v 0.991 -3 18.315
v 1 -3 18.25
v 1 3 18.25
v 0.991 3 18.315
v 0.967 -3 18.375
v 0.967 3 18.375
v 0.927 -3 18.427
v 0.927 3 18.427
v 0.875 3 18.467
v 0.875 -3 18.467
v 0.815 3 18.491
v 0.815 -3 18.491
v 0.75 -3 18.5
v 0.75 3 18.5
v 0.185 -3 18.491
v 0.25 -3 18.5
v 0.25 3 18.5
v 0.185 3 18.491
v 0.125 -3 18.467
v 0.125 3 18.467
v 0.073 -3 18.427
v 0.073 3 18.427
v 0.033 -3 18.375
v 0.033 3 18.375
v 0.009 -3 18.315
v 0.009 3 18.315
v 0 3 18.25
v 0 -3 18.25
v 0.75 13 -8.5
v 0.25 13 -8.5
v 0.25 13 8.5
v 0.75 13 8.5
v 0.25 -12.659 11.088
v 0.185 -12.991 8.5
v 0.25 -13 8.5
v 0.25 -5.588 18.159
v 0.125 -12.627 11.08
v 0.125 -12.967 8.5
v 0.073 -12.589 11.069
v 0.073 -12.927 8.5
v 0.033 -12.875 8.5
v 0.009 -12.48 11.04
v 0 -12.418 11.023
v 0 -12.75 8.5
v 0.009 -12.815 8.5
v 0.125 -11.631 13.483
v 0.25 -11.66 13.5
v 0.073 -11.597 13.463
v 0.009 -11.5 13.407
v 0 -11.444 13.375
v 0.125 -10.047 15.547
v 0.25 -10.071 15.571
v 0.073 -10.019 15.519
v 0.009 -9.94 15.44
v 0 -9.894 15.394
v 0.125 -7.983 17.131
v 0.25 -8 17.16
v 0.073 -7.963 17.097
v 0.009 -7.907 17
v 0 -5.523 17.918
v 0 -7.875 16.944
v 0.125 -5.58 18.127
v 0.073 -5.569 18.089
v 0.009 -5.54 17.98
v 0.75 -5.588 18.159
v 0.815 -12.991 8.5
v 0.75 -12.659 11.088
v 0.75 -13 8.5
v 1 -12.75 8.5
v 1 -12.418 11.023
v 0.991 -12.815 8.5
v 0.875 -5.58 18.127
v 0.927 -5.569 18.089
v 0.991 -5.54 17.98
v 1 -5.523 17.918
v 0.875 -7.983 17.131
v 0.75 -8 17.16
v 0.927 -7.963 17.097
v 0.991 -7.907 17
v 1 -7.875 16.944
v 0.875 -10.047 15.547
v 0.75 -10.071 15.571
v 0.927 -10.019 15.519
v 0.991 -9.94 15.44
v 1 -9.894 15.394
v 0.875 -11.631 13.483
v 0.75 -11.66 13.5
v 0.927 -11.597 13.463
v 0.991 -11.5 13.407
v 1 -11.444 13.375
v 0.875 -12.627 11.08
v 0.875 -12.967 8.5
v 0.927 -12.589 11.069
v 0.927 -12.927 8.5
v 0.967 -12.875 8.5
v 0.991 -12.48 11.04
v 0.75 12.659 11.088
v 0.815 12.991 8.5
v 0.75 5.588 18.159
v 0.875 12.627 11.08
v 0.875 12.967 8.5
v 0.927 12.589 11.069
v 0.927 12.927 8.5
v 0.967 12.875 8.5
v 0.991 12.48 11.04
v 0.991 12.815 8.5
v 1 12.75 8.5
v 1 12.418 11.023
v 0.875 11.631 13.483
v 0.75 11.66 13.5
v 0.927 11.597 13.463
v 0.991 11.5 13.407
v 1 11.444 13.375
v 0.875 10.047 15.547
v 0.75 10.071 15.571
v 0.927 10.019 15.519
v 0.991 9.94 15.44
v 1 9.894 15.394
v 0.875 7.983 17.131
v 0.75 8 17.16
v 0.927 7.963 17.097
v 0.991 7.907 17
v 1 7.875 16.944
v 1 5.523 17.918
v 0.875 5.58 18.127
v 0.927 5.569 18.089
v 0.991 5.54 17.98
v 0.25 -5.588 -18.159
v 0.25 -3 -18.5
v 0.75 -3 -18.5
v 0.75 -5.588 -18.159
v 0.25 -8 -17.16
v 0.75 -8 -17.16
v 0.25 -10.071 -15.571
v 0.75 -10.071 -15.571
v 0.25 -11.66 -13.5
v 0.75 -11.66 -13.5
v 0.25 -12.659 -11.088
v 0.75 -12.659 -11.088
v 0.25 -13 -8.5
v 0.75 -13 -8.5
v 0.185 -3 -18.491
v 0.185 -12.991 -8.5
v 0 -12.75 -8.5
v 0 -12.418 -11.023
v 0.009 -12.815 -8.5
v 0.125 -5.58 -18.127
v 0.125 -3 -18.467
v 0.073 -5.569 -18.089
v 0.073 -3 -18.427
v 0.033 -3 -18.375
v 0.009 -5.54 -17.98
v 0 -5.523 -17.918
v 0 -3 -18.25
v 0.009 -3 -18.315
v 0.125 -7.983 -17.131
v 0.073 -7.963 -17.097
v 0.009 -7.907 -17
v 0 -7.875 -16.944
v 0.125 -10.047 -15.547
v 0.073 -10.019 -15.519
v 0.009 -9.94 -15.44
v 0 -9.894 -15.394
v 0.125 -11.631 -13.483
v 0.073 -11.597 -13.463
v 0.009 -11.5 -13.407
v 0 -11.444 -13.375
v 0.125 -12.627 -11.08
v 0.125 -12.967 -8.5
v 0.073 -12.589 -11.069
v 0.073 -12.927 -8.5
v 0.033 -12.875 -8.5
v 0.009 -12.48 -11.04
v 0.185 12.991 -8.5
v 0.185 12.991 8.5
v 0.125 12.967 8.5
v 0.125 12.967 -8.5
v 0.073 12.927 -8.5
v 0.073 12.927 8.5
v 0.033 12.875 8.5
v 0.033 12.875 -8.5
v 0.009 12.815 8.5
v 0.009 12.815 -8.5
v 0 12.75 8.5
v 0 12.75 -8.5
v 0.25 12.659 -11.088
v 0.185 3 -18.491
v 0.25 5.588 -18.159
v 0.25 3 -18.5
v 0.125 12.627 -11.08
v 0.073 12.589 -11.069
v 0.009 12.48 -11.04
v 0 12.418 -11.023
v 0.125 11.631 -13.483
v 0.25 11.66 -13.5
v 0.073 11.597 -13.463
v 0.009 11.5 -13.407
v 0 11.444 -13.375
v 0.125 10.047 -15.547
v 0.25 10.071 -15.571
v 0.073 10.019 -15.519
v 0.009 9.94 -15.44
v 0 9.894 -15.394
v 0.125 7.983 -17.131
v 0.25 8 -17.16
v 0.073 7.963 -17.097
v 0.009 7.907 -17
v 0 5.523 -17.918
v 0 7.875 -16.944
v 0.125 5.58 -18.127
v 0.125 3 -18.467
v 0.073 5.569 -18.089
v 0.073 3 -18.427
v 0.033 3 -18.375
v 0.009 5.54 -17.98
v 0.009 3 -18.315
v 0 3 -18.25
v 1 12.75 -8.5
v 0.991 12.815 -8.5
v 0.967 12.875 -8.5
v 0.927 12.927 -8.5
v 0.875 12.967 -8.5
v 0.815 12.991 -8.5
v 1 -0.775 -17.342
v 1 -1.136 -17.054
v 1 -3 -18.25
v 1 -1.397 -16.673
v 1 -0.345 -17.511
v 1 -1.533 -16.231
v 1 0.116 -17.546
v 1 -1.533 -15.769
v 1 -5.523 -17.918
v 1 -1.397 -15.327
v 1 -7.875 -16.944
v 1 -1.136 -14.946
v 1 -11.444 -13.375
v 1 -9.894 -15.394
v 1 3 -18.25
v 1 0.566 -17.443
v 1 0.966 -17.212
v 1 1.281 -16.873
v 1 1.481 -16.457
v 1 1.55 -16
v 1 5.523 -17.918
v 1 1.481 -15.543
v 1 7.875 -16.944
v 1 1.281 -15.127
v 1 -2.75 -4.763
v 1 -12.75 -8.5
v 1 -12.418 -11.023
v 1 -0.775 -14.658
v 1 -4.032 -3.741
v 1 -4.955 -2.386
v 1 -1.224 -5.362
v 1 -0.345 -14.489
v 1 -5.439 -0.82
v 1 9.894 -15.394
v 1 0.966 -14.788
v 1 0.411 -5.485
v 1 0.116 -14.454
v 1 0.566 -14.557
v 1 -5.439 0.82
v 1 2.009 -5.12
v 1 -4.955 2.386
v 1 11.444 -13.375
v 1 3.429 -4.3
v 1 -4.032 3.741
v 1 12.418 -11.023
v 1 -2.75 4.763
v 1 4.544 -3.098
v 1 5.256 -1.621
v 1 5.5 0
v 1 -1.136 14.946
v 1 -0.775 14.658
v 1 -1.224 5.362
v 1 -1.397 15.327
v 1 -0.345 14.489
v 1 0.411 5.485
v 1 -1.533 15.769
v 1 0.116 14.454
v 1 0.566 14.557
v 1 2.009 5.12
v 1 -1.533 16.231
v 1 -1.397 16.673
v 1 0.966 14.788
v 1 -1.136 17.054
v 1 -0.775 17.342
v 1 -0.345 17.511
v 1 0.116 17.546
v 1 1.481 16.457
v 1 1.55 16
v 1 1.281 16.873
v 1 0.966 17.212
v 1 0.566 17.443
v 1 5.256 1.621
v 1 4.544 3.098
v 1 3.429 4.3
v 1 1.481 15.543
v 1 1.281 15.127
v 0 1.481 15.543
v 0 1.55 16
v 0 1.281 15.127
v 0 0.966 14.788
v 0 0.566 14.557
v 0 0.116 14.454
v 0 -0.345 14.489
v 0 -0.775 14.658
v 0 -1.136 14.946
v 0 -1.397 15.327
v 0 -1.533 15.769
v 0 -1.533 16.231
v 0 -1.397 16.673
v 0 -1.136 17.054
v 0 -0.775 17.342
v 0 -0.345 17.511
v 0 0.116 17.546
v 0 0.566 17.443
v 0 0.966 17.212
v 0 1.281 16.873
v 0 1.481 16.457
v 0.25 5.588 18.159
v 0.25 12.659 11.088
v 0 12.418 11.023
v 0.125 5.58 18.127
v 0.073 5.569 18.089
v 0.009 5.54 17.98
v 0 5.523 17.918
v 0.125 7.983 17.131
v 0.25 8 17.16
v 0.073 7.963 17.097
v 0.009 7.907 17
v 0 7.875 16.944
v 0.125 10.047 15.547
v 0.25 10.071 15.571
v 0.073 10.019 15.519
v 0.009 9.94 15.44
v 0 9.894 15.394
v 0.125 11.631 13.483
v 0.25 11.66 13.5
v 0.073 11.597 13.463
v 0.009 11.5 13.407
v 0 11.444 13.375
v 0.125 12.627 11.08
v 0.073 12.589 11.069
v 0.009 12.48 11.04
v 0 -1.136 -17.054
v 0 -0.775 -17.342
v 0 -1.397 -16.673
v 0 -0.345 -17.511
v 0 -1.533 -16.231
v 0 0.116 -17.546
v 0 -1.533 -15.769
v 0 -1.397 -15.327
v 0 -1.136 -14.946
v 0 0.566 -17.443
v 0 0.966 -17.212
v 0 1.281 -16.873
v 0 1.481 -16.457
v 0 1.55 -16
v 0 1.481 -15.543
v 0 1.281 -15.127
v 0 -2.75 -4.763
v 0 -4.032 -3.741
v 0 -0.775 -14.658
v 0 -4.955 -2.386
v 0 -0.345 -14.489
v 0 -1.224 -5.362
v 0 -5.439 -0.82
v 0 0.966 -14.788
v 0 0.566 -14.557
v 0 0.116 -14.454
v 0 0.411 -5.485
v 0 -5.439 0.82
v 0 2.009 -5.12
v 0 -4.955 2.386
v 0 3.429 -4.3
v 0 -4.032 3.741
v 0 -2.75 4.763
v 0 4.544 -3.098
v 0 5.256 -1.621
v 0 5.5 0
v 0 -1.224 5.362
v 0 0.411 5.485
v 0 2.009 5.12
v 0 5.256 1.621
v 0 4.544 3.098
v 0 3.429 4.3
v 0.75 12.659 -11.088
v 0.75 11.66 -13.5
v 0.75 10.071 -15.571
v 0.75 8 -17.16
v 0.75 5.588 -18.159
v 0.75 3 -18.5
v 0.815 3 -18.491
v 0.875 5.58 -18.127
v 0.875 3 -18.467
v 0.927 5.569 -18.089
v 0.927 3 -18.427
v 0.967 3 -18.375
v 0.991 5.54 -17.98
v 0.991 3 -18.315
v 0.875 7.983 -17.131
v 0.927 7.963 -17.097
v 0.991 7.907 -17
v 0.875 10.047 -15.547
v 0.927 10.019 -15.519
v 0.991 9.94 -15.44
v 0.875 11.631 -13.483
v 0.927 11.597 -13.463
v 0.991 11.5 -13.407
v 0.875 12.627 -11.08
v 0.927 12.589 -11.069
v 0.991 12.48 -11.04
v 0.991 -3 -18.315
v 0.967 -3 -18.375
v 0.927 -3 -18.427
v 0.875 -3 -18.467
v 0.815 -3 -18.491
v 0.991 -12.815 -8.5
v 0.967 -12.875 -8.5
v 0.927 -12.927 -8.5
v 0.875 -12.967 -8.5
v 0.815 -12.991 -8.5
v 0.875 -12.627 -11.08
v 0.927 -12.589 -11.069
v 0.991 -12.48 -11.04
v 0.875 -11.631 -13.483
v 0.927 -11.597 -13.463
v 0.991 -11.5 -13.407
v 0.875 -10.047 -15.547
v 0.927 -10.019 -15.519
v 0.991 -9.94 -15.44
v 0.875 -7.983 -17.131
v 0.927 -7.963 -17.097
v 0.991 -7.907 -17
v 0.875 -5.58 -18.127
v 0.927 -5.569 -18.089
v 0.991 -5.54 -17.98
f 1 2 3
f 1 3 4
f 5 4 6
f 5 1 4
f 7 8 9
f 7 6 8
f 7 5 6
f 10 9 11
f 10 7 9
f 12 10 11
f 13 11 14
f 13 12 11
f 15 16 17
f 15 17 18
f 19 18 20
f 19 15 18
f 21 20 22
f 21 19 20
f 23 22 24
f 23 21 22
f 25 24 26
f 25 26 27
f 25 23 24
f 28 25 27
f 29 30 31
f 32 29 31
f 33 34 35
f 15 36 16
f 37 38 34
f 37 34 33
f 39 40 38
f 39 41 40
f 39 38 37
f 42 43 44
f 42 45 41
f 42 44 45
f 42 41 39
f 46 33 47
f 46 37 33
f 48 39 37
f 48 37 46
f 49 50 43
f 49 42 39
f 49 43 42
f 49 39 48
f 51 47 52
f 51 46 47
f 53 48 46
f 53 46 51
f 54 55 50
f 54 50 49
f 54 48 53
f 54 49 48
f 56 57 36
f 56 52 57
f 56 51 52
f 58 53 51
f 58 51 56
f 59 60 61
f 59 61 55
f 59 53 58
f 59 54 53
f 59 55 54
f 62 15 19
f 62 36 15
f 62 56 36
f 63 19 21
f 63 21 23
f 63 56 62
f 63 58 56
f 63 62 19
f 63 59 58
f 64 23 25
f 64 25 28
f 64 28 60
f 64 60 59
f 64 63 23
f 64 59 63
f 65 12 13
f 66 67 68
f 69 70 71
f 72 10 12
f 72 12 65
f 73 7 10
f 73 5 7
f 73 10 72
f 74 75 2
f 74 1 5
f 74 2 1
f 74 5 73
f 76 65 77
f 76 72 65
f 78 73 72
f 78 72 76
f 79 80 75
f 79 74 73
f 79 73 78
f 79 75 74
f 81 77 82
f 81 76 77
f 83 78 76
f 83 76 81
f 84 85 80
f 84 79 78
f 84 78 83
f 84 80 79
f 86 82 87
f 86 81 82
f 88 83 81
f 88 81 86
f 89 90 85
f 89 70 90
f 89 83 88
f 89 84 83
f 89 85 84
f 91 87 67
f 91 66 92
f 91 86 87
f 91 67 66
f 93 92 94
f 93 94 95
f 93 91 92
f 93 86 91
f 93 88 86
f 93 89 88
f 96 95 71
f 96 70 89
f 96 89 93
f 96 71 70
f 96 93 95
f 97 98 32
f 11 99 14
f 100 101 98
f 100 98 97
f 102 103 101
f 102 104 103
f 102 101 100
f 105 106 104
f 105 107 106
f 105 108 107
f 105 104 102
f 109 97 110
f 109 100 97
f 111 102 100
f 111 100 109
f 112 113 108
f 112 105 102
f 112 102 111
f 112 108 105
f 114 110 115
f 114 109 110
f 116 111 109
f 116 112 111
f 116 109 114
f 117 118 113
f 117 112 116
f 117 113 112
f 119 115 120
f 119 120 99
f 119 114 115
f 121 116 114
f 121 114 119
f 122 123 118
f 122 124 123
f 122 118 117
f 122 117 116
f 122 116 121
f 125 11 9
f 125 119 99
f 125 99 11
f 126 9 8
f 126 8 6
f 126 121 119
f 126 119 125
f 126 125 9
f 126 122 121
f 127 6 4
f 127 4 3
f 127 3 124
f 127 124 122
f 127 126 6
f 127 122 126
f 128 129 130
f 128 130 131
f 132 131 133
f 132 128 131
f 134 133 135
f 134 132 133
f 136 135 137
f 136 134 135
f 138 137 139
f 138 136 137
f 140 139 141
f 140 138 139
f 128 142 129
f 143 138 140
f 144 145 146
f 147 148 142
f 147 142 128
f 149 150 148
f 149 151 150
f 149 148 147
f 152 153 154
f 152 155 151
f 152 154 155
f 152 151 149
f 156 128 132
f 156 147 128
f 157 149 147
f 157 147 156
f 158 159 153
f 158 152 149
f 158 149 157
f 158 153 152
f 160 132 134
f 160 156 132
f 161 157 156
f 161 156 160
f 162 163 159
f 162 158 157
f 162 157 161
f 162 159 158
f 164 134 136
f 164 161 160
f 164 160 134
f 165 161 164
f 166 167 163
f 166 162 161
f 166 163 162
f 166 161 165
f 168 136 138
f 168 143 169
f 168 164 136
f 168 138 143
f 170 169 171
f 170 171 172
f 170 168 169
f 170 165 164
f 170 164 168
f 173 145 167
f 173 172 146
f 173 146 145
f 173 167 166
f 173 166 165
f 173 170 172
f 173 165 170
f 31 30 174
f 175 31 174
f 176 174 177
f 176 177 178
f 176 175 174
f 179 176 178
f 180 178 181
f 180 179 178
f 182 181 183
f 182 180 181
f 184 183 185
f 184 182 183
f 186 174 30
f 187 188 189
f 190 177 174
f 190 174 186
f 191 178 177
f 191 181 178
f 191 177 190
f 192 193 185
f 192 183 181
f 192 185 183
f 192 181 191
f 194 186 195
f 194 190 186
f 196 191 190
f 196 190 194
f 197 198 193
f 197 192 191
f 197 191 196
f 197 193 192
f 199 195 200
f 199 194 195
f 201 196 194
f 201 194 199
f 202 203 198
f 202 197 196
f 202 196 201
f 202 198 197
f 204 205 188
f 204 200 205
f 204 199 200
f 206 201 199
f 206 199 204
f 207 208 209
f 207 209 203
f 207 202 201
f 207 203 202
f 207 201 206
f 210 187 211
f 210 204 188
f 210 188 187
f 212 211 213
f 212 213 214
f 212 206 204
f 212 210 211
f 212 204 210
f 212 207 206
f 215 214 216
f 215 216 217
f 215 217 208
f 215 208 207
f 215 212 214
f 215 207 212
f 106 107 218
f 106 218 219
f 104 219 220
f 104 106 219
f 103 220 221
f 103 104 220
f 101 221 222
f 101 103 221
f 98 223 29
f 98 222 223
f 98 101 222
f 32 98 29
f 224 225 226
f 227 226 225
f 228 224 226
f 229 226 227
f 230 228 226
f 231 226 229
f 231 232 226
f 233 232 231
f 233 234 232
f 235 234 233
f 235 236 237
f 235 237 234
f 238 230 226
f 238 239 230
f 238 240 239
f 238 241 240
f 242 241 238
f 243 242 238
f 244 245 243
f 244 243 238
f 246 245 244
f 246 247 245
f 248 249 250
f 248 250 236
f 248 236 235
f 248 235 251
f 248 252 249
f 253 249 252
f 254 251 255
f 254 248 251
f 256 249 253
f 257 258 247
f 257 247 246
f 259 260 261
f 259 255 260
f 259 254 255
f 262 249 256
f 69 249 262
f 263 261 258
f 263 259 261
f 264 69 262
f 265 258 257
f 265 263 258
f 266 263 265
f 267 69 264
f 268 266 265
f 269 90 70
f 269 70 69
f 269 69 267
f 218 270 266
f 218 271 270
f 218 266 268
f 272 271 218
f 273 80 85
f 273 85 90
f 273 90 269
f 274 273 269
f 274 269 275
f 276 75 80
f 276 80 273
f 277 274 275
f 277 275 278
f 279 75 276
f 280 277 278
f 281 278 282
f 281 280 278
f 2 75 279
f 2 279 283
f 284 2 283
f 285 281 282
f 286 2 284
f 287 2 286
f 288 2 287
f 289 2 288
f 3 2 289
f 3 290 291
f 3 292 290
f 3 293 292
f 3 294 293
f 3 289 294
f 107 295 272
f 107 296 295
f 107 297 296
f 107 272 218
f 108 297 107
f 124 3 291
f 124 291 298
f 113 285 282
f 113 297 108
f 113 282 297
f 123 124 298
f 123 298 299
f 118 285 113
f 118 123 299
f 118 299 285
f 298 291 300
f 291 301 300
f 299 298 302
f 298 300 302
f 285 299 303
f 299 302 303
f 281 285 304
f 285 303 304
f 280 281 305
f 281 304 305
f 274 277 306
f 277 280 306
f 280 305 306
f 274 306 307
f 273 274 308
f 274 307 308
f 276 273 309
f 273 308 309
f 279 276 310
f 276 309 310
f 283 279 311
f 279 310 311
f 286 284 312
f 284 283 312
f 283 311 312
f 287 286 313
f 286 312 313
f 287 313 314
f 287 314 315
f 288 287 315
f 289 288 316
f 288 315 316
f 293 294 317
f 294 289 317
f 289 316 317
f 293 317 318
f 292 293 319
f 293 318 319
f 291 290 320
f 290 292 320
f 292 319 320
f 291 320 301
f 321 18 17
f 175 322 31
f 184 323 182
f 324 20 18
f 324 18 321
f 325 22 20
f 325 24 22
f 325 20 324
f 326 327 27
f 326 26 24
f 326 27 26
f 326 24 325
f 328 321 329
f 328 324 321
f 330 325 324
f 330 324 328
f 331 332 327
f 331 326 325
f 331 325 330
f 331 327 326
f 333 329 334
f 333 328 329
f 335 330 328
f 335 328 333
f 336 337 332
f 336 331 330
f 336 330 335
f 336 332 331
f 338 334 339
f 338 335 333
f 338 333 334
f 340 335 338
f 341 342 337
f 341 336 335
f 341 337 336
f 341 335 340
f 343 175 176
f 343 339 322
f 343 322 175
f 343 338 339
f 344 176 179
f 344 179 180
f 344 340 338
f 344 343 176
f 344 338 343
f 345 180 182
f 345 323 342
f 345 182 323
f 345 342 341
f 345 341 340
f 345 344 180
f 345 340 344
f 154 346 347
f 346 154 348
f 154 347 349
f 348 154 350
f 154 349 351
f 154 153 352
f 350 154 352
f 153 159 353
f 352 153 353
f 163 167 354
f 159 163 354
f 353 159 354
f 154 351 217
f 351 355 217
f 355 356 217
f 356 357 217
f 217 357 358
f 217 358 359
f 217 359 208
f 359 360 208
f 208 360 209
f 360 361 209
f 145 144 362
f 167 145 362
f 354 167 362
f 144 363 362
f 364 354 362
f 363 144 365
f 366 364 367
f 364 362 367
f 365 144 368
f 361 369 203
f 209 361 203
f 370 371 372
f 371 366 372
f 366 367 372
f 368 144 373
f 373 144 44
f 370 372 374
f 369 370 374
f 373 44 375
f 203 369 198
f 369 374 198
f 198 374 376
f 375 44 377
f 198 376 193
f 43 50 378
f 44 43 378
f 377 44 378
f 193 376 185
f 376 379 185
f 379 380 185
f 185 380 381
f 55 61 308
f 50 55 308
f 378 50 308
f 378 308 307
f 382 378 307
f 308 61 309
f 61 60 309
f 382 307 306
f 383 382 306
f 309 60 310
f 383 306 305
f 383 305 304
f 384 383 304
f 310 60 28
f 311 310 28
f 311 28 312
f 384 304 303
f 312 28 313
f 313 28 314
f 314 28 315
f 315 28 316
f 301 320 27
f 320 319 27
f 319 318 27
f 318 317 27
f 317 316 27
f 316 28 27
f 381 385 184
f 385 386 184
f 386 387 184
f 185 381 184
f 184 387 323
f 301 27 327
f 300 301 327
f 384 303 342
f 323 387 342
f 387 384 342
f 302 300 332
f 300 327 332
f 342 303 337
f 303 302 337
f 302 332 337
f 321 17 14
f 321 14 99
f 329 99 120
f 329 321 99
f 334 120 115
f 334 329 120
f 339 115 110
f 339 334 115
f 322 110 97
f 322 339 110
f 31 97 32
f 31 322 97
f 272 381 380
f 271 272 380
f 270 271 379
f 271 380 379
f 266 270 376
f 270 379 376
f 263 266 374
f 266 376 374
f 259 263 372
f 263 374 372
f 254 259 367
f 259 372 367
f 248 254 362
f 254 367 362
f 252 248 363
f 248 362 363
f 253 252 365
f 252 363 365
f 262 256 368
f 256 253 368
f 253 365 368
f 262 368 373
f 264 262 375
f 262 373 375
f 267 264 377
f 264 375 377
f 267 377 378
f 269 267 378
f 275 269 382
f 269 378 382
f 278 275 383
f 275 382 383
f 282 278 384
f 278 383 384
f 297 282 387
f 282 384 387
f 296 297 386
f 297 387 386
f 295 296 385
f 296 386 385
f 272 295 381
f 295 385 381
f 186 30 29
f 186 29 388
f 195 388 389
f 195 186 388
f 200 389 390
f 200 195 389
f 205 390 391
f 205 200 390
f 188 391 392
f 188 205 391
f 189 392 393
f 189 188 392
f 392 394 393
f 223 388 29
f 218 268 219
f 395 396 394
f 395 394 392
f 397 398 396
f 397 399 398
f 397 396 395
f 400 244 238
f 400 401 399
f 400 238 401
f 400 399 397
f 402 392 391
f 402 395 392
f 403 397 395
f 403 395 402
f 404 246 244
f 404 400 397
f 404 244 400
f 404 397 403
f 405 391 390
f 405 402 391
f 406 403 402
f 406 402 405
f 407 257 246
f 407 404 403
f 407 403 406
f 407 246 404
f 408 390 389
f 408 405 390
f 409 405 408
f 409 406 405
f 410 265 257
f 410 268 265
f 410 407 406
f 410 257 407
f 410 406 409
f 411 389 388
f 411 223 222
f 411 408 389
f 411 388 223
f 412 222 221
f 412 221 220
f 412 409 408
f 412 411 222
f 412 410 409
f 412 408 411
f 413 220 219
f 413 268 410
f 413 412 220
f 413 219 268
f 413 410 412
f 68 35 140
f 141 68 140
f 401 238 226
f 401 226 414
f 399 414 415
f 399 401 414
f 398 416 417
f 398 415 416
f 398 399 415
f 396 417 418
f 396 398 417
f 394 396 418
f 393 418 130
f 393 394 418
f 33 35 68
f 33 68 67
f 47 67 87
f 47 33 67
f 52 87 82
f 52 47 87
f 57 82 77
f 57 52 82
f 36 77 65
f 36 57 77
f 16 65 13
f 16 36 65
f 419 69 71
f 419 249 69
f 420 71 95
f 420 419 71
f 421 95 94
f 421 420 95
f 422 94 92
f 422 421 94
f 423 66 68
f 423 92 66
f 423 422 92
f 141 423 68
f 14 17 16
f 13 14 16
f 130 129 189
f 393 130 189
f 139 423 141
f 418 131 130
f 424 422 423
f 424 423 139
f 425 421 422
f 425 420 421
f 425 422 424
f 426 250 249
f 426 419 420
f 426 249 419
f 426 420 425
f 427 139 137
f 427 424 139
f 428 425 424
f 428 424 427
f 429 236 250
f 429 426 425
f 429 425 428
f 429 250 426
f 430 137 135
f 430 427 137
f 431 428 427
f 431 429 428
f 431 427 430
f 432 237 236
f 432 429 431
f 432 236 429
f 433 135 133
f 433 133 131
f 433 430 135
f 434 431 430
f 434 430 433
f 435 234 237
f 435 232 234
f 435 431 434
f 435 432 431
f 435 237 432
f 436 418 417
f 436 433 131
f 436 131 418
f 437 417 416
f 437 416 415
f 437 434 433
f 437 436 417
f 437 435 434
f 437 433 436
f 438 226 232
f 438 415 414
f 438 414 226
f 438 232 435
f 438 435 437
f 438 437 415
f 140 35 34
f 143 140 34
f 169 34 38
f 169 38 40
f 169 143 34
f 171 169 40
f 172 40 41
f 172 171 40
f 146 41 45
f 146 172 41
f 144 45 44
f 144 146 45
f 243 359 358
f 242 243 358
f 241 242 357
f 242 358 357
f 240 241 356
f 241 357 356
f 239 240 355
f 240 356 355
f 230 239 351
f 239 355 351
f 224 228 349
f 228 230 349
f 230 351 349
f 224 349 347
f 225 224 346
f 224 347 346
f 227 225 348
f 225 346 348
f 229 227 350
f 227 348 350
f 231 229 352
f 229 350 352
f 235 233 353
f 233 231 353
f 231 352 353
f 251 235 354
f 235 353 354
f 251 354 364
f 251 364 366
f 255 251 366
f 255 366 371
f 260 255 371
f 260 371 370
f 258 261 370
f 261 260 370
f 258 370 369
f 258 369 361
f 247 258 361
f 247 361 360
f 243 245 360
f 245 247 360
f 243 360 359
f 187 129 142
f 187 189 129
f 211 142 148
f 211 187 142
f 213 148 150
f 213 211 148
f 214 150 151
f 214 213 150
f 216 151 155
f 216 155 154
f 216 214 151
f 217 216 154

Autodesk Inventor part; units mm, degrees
ref_plane "YZ Plane" through (0, 0, 0) normal (1, 0, 0) x (0, 1, 0)
ref_plane "XZ Plane" through (0, 0, 0) normal (0, 1, 0) x (-1, 0, 0)
ref_plane "XY Plane" through (0, 0, 0) normal (0, 0, 1) x (1, 0, 0)
sketch "Sketch1" plane through (0, 0, 0) normal (1, 0, 0) x (0, 1, 0)
  circle A0 centre (0, 0) radius 5.5
  line L0 (3, 18.5) -> (-3, 18.5)
  line L1 (-13, 8.5) -> (-13, -8.5)
  line L2 (-3, -18.5) -> (3, -18.5)
  line L3 (13, -8.5) -> (13, 8.5)
  line L4 (13, 18.5) -> (-13, -18.5) construction
  line L5 (-13, 18.5) -> (13, -18.5) construction
  circle A1 centre (0, 16) radius 1.55
  line L6 (0, 0) -> (10.4906, 0) construction
  circle A2 centre (0, -16) radius 1.55
  line L7 (0, 0) -> (0, 32) construction
  arc A3 (13, 8.5) -> (3, 18.5) centre (3, 8.5) ccw
  arc A4 (-3, 18.5) -> (-13, 8.5) centre (-3, 8.5) ccw
  arc A5 (-13, -8.5) -> (-3, -18.5) centre (-3, -8.5) ccw
  arc A6 (3, -18.5) -> (13, -8.5) centre (3, -8.5) ccw
  dimension "d0" = 11
  dimension "d1" = 2.5
  dimension "d2" = 37
  dimension "d3" = 26
  dimension "d4" = 3.1
  dimension "d5" = 10
extrude "Extrusion1" add sketch "Sketch1" along normal blind 1
fillet "Fillet1" radius 0.25 16 edges at (1, 0, 18.5) (1, -10.0711, 15.5711) (1, -13, 0) (1, -10.0711, -15.5711) (1, 0, -18.5) (1, 10.0711, -15.5711) (1, 13, 0) (1, 10.0711, 15.5711) (0, 0, 18.5) (0, -10.0711, 15.5711) (0, -13, 0) (0, -10.0711, -15.5711) (0, 0, -18.5) (0, 10.0711, -15.5711) (0, 13, 0) (0, 10.0711, 15.5711)
properties part number "Component 7 (Cover Plate)"
